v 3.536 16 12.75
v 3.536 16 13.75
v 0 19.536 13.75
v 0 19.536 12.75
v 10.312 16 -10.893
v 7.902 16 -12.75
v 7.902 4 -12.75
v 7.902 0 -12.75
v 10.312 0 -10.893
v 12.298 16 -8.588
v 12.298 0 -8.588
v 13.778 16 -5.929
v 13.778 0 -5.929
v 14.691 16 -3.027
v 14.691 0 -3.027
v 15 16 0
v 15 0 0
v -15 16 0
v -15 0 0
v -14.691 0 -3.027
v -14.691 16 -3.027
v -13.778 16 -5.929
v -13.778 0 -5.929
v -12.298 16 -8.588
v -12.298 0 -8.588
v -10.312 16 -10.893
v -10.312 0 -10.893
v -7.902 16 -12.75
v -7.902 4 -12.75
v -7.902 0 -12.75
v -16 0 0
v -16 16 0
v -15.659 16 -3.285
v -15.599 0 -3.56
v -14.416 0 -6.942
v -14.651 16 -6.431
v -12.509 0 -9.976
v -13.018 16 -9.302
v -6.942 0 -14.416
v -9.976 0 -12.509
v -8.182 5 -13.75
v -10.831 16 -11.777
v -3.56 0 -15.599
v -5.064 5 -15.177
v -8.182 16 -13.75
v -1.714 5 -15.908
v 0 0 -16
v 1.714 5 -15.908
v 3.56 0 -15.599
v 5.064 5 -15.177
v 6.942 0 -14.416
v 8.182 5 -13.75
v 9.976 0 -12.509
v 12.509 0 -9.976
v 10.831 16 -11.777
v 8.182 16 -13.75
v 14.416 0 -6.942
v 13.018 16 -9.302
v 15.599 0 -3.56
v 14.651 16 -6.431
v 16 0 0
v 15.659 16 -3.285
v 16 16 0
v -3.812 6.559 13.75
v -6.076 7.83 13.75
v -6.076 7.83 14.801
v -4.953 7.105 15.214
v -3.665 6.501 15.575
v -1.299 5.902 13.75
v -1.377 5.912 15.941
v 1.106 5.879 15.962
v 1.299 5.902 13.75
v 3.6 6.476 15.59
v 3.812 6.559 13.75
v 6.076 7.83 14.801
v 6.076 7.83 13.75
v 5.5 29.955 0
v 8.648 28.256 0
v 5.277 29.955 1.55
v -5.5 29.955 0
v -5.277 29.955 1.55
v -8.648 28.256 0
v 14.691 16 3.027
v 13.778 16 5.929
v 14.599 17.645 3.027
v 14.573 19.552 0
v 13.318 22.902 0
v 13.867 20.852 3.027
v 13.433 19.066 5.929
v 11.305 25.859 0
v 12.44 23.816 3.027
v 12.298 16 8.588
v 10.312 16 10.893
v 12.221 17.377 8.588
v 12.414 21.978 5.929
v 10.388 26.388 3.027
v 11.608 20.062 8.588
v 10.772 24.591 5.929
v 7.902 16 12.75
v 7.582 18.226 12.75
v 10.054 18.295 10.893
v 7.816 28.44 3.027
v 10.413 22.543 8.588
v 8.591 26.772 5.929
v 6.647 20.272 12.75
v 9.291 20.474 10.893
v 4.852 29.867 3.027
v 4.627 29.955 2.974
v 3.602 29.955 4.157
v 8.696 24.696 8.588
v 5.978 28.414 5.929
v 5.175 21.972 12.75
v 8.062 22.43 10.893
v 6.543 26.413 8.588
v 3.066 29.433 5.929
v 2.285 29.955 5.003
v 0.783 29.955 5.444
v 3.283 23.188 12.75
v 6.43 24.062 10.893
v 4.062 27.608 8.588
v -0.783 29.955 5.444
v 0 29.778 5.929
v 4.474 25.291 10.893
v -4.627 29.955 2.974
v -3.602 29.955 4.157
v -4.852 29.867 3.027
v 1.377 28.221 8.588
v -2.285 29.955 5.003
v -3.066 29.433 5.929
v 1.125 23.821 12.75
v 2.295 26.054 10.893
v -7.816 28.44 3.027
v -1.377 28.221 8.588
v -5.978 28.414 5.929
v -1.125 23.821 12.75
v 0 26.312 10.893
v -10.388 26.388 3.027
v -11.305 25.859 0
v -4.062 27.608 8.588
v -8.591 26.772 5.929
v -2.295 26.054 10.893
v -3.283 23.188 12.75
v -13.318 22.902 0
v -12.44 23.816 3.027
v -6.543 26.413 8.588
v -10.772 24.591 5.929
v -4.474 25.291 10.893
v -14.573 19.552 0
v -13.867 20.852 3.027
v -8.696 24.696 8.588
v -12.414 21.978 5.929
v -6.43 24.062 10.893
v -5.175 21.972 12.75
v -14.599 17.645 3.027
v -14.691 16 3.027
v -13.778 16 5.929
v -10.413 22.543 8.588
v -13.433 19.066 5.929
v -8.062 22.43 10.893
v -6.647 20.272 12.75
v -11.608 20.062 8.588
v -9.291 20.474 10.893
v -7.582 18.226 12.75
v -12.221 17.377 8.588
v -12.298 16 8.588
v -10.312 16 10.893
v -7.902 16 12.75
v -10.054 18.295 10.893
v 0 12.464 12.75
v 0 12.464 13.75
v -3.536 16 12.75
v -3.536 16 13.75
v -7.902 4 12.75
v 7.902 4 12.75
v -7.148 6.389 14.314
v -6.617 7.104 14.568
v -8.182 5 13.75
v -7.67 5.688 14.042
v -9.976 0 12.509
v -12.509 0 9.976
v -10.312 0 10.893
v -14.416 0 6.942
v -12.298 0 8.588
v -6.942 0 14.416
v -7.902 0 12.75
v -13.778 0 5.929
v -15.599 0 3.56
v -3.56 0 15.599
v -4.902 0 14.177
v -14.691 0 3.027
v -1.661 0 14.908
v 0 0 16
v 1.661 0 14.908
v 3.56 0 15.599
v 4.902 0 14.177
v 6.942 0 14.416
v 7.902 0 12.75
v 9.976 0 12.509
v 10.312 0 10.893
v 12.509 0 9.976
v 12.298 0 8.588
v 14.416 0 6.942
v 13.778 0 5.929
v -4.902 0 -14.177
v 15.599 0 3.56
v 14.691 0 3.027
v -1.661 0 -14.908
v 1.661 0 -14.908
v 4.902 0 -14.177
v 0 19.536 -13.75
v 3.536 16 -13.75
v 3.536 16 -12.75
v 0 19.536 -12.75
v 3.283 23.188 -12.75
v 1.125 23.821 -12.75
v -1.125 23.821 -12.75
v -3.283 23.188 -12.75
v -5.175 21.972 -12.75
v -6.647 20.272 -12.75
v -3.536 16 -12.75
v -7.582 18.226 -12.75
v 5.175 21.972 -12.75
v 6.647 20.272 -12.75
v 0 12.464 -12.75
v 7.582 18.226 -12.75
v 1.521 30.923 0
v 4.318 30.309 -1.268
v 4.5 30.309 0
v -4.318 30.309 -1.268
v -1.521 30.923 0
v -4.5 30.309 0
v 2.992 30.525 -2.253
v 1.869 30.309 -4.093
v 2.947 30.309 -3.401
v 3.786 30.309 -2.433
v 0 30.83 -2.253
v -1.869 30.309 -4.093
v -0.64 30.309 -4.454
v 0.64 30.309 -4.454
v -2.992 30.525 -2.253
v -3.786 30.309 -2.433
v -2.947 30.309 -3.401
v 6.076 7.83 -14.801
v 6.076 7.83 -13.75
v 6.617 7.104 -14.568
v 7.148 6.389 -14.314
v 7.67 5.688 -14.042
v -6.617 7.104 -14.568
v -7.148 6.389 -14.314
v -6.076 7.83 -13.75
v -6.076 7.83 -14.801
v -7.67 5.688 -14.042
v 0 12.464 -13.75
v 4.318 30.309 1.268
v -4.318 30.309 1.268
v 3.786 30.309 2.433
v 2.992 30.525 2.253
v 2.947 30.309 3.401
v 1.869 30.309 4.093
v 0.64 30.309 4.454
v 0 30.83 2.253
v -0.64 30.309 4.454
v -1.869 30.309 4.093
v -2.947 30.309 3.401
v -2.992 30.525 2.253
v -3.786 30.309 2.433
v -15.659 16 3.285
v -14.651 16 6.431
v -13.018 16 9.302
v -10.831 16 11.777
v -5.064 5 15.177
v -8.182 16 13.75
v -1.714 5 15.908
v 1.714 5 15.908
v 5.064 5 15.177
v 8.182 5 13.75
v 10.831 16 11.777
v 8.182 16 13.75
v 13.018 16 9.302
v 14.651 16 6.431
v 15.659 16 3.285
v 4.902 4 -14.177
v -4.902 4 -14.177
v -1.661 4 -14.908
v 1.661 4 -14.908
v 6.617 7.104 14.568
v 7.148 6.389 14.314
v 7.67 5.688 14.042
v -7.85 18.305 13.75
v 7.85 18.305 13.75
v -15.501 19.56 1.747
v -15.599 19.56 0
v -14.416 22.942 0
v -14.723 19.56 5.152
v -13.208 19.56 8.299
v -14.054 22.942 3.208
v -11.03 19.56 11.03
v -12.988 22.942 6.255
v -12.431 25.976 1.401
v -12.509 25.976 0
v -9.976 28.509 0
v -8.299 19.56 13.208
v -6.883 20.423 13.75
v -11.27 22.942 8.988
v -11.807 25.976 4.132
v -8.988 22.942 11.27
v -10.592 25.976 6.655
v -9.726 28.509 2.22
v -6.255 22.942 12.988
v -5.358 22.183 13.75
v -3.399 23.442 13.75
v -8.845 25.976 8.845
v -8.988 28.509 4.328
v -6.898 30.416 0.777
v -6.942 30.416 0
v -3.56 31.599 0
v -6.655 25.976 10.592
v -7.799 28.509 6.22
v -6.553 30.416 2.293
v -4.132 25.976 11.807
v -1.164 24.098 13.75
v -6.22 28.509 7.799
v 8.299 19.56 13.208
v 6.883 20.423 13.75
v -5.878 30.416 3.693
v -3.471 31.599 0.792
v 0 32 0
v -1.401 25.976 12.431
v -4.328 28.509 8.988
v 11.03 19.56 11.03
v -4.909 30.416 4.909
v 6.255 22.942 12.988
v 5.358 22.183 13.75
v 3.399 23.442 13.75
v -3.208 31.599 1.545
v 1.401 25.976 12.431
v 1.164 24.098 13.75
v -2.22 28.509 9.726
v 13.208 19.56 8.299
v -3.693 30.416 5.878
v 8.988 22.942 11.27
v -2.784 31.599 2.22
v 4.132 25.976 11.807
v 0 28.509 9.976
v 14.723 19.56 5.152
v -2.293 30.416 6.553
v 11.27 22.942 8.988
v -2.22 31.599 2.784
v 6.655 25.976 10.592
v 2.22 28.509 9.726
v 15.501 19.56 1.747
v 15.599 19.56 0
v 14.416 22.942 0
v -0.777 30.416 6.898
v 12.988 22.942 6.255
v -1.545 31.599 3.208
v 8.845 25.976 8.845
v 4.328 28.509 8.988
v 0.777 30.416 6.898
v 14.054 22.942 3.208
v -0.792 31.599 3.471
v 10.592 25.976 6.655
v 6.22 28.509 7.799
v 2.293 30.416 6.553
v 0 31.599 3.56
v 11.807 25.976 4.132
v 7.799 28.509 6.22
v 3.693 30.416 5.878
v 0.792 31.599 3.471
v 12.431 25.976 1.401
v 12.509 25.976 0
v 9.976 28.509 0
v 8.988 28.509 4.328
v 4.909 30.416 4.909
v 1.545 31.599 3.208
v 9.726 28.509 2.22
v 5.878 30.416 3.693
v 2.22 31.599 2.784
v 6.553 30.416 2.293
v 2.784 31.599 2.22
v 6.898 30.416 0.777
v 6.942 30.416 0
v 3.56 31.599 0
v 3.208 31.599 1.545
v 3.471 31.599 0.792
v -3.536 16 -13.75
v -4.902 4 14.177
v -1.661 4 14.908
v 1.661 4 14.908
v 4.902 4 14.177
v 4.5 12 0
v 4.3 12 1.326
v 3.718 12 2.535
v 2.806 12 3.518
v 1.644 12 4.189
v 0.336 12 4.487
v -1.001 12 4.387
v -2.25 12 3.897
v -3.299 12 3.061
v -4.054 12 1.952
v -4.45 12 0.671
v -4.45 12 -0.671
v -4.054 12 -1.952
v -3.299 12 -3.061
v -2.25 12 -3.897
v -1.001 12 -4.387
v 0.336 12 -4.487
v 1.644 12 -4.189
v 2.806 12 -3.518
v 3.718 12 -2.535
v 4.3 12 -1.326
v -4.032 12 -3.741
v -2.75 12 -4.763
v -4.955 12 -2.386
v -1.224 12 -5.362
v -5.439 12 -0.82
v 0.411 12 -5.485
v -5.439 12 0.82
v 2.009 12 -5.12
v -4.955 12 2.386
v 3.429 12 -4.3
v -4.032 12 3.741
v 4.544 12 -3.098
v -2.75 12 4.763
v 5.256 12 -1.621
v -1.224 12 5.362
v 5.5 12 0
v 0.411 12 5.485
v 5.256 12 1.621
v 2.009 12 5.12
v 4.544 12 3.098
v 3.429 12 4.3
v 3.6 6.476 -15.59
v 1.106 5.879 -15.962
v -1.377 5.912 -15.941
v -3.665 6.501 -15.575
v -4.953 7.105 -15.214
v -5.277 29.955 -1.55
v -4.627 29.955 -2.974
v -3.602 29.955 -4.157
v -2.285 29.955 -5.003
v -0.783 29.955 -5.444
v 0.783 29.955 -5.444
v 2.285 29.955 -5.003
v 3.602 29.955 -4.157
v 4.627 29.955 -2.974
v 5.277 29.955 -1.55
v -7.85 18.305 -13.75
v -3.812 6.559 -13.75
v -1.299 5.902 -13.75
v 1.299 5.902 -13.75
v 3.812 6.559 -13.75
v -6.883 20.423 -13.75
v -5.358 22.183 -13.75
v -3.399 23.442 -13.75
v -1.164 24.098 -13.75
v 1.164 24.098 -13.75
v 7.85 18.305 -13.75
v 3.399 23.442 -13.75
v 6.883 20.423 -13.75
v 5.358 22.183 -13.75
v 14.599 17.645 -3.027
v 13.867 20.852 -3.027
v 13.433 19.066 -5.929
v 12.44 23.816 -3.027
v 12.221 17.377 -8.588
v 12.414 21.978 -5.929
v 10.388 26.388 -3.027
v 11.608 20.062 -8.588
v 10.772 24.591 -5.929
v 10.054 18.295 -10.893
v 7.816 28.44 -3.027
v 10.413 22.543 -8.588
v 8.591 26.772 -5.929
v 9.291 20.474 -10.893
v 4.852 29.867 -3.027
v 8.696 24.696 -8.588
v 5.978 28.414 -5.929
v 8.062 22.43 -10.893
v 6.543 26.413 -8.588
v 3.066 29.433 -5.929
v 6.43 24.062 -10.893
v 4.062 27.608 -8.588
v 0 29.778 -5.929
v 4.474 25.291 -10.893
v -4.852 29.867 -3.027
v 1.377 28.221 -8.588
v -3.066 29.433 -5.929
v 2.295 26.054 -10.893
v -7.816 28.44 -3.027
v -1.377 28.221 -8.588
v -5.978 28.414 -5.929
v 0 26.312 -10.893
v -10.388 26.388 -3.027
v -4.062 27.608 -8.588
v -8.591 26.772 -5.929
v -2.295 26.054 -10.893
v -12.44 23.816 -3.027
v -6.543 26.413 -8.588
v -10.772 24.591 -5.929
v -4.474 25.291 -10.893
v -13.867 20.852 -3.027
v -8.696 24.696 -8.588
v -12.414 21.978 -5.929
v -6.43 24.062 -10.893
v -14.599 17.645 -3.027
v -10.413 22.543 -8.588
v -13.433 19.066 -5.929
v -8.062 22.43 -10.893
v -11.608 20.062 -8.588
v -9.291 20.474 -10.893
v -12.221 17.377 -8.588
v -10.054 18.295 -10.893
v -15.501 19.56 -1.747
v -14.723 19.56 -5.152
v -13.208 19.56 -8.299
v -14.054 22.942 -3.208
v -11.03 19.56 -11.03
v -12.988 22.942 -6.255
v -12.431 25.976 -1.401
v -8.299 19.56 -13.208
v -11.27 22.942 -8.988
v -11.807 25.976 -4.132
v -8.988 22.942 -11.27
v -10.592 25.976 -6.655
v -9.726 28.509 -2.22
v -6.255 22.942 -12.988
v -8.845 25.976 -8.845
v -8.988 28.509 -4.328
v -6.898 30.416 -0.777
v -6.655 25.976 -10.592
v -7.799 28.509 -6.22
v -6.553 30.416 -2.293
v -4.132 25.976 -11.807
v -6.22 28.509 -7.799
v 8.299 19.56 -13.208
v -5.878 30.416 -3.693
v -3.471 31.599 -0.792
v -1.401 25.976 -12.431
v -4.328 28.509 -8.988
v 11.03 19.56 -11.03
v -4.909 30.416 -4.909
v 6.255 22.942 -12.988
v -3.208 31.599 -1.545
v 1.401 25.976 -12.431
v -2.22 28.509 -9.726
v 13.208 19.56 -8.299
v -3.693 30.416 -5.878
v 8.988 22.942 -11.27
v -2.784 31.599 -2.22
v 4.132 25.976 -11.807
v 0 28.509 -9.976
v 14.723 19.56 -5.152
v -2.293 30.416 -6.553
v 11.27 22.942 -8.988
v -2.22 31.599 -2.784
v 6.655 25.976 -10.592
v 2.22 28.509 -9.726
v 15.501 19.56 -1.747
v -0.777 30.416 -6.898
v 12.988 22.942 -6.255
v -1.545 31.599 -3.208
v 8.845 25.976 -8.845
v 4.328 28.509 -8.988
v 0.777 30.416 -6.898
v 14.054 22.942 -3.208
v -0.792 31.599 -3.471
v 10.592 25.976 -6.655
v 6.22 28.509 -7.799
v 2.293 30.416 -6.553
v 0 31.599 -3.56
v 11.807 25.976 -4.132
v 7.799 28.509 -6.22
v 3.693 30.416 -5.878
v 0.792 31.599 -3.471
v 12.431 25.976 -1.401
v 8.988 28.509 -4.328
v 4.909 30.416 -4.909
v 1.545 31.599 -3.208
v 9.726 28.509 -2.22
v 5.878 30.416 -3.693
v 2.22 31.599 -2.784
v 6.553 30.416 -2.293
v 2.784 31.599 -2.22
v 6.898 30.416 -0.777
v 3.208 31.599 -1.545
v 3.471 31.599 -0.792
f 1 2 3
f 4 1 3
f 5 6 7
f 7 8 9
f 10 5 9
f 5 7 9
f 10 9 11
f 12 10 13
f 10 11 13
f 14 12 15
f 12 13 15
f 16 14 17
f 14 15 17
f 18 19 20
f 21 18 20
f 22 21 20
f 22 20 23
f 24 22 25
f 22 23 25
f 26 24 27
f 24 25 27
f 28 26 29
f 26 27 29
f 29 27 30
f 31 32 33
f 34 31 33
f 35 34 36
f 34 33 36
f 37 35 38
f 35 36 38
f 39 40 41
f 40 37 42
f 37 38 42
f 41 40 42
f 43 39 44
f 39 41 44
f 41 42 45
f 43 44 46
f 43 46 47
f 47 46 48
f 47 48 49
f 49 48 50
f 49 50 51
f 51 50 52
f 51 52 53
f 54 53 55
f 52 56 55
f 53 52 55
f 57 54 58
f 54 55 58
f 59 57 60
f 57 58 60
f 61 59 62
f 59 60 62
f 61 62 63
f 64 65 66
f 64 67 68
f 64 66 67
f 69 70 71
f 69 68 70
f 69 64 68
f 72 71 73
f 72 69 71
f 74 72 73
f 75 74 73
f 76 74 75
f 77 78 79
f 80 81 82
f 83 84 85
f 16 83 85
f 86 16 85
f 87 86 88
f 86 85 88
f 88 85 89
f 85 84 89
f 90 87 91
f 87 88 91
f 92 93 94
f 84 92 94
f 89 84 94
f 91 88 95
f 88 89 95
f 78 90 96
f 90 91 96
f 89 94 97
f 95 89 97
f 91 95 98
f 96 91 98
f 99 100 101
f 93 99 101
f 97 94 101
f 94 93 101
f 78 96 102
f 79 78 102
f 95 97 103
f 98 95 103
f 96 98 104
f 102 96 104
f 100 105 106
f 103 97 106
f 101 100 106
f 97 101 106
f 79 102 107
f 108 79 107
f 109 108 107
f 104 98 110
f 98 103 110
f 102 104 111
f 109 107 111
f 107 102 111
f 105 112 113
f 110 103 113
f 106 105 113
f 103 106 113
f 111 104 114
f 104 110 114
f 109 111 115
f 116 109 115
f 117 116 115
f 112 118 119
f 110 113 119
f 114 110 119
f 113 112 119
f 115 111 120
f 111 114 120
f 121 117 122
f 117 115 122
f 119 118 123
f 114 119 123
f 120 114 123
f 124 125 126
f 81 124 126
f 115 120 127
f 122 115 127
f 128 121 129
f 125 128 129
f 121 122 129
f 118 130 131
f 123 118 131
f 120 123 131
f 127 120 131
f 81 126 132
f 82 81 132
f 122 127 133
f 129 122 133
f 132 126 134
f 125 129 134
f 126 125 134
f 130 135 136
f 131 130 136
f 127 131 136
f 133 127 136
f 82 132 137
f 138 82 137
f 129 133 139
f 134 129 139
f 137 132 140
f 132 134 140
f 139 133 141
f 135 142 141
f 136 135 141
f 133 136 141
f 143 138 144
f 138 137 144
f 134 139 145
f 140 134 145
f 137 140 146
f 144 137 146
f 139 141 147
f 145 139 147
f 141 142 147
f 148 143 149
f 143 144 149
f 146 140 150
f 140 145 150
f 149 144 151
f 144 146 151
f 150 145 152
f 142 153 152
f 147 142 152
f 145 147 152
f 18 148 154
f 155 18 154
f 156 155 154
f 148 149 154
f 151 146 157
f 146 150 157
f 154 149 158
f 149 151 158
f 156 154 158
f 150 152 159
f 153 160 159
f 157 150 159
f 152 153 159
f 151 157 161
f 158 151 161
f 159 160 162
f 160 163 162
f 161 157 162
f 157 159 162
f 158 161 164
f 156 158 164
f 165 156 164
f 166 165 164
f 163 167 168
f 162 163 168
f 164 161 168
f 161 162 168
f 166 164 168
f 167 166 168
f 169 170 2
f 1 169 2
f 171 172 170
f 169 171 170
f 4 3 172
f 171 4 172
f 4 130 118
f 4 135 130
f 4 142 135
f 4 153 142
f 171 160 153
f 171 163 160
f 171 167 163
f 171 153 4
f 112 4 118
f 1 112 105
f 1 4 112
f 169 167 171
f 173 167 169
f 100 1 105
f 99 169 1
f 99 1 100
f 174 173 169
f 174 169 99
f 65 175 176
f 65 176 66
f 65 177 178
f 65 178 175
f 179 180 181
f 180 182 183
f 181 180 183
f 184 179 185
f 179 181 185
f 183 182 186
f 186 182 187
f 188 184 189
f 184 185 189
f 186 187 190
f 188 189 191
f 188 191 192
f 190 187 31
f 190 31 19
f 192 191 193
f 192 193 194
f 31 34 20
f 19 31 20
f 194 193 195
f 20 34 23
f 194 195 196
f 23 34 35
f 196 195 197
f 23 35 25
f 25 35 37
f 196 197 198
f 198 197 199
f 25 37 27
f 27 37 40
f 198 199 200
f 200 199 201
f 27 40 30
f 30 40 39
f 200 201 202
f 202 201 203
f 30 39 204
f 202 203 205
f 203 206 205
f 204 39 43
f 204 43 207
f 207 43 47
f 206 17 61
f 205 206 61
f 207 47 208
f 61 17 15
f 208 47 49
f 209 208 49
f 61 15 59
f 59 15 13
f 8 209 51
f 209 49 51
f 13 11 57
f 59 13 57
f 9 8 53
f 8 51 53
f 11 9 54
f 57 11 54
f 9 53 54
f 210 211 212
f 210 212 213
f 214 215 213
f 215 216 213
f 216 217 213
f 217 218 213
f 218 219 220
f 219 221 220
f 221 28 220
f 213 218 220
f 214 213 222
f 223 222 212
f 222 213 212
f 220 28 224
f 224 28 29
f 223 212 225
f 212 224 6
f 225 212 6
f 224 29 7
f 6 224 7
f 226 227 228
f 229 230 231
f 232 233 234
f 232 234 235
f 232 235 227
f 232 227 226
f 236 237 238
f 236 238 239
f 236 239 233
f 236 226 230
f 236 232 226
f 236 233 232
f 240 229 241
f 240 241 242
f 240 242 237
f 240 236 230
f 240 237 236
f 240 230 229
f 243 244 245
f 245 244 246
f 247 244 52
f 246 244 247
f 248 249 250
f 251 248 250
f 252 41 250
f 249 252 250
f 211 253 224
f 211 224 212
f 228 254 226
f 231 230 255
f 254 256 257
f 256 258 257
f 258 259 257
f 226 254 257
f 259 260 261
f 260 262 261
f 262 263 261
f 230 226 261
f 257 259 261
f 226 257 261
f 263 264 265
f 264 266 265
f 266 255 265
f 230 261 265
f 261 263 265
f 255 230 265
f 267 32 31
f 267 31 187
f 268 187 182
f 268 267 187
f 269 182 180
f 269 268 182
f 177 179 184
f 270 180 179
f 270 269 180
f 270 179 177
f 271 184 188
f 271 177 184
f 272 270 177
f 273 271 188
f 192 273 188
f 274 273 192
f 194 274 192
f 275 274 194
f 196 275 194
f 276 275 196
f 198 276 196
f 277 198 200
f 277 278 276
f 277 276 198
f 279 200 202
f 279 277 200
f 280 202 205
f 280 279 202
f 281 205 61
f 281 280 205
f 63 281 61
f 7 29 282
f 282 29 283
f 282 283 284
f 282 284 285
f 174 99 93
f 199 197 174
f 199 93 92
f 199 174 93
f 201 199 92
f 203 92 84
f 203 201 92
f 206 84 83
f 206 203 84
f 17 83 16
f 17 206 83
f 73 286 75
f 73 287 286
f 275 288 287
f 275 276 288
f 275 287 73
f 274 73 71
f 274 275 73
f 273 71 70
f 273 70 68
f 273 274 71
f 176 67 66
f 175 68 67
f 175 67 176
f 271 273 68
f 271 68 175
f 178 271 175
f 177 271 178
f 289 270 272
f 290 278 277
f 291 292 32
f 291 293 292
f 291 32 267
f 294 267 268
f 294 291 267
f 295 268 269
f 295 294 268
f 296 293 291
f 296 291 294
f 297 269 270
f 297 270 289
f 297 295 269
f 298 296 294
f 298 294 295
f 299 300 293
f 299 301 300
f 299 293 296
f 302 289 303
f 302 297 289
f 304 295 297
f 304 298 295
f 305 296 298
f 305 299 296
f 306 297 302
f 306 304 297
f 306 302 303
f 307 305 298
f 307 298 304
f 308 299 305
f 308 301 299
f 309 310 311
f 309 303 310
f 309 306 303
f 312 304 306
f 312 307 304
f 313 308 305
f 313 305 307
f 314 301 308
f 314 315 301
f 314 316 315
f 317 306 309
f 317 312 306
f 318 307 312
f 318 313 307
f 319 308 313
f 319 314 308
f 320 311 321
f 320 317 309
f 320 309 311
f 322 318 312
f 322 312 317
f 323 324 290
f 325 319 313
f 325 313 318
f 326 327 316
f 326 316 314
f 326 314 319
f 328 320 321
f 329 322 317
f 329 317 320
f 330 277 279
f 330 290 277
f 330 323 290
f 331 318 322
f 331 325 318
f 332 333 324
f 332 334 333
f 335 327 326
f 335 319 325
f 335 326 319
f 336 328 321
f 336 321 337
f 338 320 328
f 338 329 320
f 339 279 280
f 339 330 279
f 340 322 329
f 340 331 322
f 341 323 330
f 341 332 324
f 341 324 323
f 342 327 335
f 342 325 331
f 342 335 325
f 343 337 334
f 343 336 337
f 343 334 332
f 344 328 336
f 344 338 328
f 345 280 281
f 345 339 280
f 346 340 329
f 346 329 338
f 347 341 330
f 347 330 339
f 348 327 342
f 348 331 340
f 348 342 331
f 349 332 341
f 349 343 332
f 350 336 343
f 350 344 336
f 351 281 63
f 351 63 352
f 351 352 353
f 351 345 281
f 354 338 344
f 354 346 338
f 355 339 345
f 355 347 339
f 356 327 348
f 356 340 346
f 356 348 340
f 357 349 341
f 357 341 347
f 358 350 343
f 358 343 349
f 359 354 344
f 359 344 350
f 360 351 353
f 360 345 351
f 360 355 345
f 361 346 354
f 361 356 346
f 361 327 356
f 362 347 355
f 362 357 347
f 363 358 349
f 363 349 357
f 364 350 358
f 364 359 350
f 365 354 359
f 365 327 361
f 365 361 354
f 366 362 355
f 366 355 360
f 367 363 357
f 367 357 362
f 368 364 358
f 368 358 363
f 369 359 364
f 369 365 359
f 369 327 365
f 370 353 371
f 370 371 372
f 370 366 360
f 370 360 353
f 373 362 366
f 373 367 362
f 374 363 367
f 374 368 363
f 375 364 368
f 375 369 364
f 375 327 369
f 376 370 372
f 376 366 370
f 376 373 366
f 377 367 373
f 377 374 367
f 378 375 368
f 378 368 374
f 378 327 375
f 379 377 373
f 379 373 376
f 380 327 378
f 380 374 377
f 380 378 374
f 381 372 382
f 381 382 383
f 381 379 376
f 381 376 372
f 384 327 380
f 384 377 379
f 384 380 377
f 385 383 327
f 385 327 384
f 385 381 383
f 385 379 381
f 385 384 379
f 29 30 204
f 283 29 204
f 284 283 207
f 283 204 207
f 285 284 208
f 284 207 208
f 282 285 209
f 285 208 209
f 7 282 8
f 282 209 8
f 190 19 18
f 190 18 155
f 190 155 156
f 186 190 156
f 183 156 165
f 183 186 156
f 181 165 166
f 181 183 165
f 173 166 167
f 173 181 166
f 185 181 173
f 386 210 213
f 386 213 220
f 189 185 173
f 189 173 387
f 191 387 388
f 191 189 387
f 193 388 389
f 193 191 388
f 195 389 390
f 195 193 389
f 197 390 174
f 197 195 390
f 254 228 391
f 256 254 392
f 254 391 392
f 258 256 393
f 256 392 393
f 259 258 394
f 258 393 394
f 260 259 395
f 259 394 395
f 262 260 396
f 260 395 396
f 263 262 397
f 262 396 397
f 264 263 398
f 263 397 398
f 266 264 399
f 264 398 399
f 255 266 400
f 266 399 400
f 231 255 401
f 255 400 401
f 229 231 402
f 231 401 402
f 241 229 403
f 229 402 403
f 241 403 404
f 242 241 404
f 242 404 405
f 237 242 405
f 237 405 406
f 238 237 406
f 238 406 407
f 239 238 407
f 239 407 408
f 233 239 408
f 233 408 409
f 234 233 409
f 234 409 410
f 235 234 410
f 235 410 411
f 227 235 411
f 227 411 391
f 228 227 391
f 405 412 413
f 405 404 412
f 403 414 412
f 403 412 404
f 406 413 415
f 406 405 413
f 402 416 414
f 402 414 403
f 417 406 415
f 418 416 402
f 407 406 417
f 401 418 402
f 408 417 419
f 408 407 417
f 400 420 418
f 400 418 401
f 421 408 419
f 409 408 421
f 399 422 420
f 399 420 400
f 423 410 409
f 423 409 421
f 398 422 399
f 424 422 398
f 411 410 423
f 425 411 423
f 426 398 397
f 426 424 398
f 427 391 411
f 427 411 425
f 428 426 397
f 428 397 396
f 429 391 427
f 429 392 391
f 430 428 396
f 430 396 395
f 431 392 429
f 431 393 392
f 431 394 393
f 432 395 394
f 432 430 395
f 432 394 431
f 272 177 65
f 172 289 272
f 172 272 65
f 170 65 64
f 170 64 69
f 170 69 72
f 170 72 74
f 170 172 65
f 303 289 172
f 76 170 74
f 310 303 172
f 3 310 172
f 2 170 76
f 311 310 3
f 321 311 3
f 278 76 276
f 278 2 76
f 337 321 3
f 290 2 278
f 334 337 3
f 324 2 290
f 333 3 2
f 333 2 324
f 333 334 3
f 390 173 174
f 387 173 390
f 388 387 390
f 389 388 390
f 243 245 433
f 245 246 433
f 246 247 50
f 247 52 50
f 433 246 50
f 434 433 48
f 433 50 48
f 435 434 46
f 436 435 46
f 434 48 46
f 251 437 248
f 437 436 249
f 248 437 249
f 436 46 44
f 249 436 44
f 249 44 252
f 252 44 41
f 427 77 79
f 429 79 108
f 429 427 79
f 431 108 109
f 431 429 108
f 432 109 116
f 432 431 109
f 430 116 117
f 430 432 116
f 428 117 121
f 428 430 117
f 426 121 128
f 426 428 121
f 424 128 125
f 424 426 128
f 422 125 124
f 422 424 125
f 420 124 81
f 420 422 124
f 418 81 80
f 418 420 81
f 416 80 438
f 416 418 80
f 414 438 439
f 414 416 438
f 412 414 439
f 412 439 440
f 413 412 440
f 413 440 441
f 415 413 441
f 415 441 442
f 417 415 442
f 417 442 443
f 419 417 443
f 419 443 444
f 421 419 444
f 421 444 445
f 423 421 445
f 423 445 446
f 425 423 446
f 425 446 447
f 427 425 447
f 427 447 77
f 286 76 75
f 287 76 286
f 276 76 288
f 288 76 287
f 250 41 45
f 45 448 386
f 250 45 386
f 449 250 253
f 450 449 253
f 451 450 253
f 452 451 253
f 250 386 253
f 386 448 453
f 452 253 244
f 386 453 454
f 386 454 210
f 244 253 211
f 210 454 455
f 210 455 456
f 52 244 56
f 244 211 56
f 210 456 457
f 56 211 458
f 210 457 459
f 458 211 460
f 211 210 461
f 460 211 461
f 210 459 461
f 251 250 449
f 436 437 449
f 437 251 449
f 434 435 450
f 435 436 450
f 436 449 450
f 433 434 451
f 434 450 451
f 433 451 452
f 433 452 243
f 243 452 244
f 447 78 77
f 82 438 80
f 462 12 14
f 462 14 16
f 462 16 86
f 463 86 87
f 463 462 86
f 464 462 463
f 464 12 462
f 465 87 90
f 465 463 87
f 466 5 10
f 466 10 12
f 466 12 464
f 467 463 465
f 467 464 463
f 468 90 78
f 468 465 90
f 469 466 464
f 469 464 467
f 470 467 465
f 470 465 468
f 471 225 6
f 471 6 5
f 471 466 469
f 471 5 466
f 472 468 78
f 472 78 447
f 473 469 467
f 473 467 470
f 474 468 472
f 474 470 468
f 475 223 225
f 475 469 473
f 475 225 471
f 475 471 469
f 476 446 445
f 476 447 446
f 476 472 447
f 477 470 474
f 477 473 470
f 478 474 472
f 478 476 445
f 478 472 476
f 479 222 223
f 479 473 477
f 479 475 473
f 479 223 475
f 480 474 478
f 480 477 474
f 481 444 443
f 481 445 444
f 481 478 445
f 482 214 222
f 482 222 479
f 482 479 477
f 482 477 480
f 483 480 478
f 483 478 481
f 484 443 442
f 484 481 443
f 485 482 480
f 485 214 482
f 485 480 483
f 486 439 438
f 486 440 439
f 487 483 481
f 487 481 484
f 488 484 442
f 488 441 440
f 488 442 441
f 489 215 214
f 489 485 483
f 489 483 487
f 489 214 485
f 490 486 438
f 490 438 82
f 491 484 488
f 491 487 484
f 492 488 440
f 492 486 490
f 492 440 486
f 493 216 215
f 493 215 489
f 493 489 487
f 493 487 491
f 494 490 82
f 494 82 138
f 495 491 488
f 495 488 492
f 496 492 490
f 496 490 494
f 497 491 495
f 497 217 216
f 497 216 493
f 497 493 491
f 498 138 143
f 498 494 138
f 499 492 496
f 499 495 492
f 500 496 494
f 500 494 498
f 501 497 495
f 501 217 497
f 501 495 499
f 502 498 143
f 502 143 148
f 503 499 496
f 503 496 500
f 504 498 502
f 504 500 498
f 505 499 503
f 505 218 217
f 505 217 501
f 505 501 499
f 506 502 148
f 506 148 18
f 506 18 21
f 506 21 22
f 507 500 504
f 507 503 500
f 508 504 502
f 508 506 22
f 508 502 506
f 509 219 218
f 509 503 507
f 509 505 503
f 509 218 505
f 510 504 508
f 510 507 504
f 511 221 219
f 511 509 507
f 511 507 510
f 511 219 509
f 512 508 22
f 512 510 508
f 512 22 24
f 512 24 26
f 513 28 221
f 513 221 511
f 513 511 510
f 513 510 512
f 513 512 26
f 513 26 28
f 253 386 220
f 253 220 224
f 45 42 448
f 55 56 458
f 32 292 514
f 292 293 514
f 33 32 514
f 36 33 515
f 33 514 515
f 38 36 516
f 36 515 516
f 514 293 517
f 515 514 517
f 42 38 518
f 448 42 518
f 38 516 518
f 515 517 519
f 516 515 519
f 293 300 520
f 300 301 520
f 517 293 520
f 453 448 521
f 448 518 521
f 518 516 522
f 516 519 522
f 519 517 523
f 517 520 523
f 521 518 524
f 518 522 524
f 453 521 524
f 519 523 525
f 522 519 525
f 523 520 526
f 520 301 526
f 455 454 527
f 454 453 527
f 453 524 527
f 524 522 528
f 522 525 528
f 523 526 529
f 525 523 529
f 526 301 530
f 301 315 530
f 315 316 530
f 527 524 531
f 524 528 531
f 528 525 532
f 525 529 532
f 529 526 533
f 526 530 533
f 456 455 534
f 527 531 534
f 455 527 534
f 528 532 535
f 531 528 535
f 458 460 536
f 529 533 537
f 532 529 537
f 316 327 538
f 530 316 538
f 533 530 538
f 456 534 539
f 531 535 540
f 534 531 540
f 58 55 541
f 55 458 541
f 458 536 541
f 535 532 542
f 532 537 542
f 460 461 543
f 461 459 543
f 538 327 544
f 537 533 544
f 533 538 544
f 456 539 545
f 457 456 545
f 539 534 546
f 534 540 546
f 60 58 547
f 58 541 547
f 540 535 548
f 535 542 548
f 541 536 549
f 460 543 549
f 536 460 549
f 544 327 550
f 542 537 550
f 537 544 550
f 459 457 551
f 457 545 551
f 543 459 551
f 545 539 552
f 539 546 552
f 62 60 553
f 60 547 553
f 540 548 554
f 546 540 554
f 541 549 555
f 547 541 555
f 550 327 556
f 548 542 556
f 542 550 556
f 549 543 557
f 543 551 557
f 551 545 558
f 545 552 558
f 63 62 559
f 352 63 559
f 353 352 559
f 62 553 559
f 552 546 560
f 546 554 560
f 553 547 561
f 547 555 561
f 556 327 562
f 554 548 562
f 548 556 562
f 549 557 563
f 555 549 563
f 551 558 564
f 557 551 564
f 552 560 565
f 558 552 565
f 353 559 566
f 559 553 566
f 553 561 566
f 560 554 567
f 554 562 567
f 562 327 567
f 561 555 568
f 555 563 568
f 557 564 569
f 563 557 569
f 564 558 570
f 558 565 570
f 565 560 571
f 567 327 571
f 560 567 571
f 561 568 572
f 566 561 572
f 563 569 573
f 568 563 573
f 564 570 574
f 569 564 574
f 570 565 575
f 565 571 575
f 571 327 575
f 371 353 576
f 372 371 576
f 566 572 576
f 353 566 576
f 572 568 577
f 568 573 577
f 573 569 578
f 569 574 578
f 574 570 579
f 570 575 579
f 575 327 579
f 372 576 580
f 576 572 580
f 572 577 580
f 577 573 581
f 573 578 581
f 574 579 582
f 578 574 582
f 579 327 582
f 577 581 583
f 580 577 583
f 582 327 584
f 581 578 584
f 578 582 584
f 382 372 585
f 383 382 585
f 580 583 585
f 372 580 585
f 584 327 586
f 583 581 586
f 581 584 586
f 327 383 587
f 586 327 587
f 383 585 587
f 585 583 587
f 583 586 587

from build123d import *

# Parameters (mm, degrees)
REVOLVE1_ANGLE           = 180
CUT_EXTRUDE1_DEPTH       = 39.328351126
SHELL1_DEPTH             = 16
SHELL1_2_DEPTH           = 4
EXTRUDE1_REACH           = 40.328
EXTRUDE1_END_RADIUS      = 16
CUT_EXTRUDE2_REACH       = 40.328
EXTRUDE_THIN1_REACH      = 53.192
EXTRUDE_THIN1_END_RADIUS = 15
EXTRUDE_THIN1_START      = -12
SKETCH5_R                = 5.5
SKETCH5_R_2              = 4.5


with BuildPart() as part:
    # Sketch1 → Revolve1 (revolve)
    with BuildSketch(Plane(origin=(0, 0, 0), x_dir=(-1, 0, 0), z_dir=(0, 0, -1))):
        with BuildLine():
            Line((0, 0), (16, 0))
            Line((16, 0), (16, 16))
            ThreePointArc((16, 16), (11.313708499, 27.313708499), (0, 32))
            Line((0, 32), (0, 0))
        make_face()
    revolve(axis=Axis((0, 0, 0), (0, 1, 0)), revolution_arc=REVOLVE1_ANGLE)

    # Sketch2 → Cut-Extrude1 (cut, through all)
    with BuildSketch(Plane.XY.offset(13.75)):
        with BuildLine():
            Line((8.181534086, 5), (8.181534086, 16))
            ThreePointArc((8.181534086, 16), (0, 24.181534086), (-8.181534086, 16))
            Line((-8.181534086, 16), (-8.181534086, 5))
            Line((-8.181534086, 5), (8.181534086, 5))
        make_face()
    extrude(amount=CUT_EXTRUDE1_DEPTH, mode=Mode.SUBTRACT)

    # Shell1: read off the stored shape, not the designer's step
    # Shell1 outline → Shell1 (cut)
    with BuildSketch(Plane(origin=(0, 0, 0), x_dir=(1, 0, 0), z_dir=(0, 1, 0))):
        with BuildLine():
            ThreePointArc((7.901740315, -12.75), (13.105840391, -7.296365372), (15, 0))
            Line((15, 0), (-15, 0))
            ThreePointArc((-15, 0), (-13.105840391, -7.296365372), (-7.901740315, -12.75))
            Line((-7.901740315, -12.75), (7.901740315, -12.75))
        make_face()
    extrude(amount=SHELL1_DEPTH, mode=Mode.SUBTRACT)

    # Shell1 2 outline → Shell1 2 (cut)
    with BuildSketch(Plane(origin=(0, 0, 0), x_dir=(1, 0, 0), z_dir=(0, 1, 0))):
        with BuildLine():
            ThreePointArc((-7.901740315, -12.75), (0, -15), (7.901740315, -12.75))
            Line((7.901740315, -12.75), (-7.901740315, -12.75))
        make_face()
    extrude(amount=SHELL1_2_DEPTH, mode=Mode.SUBTRACT)

    # Shell1 3 outline → Shell1 3 (revolve, cut)
    with BuildSketch(Plane.XZ.offset(-16)):
        with BuildLine():
            ThreePointArc((15, 0), (13.105840391, 7.296365372), (7.901740315, 12.75))
            Line((7.901740315, 12.75), (0, 12.75))
            Line((0, 12.75), (0, 0))
            Line((0, 0), (15, 0))
        make_face()
    revolve(axis=Axis((0, 16, 0), (0, 0, 1)), mode=Mode.SUBTRACT)

    # Extrude1: up to this cylinder (the profile starts inside it)
    extrude1_end = Plane(origin=(0, 6.31611, 0), z_dir=(0, -1, 0)) * Cylinder(EXTRUDE1_END_RADIUS, 113.656, mode=Mode.PRIVATE)
    # Sketch3 → Extrude1 (add, up to the surface)
    with BuildSketch(Plane.XY.offset(13.75), mode=Mode.PRIVATE) as extrude1_sk1:
        with BuildLine():
            Line((6.076328446, 7.830430308), (8.181534086, 5))
            Line((8.181534086, 5), (-8.181534086, 5))
            Line((-8.181534086, 5), (-6.076328446, 7.830430308))
            ThreePointArc((-6.076328446, 7.830430308), (0, 5.818465914), (6.076328446, 7.830430308))
        make_face()
    extrude1_tool1 = extrude(extrude1_sk1.sketch, amount=EXTRUDE1_REACH, mode=Mode.PRIVATE) & extrude1_end
    add(extrude1_tool1.solids().sort_by_distance((6.995686, 6.31611, 13.75))[0])

    # Sketch4 → Cut-Extrude2 (cut, up to next)
    with BuildSketch(Plane.XY.offset(13.75), mode=Mode.PRIVATE) as cut_extrude2_sk1:
        Polygon((-3.535533906, 16), (0, 12.464466094), (3.535533906, 16), (0, 19.535533906), align=None)
    cut_extrude2_tool1 = extrude(cut_extrude2_sk1.sketch, amount=-CUT_EXTRUDE2_REACH, mode=Mode.PRIVATE) & part.part
    add(cut_extrude2_tool1.solids().sort_by_distance((0, 16, 13.75))[0], mode=Mode.SUBTRACT)

    # Mirror1: part across face


with BuildPart() as part_1:
    add(part.part)
    add(part.part.mirror(Plane(origin=(0, 18.784156894, 0), x_dir=(1, 0, 0), z_dir=(0, 0, -1))))

    # Extrude-Thin1: up to this sphere (the profile starts inside it)
    extrude_thin1_end = Location((0, 16, 0)) * Sphere(EXTRUDE_THIN1_END_RADIUS, mode=Mode.PRIVATE)
    # Sketch5 → Extrude-Thin1 (add, up to the surface)
    with BuildSketch(Plane.XZ.offset(EXTRUDE_THIN1_START), mode=Mode.PRIVATE) as extrude_thin1_sk1:
        Circle(SKETCH5_R)
        Circle(SKETCH5_R_2, mode=Mode.SUBTRACT)
    extrude_thin1_tool1 = extrude(extrude_thin1_sk1.sketch, amount=-EXTRUDE_THIN1_REACH, mode=Mode.PRIVATE) & extrude_thin1_end
    add(extrude_thin1_tool1.solids().sort_by_distance((-5.344437, 12, 0))[0])


solid = part_1.part
